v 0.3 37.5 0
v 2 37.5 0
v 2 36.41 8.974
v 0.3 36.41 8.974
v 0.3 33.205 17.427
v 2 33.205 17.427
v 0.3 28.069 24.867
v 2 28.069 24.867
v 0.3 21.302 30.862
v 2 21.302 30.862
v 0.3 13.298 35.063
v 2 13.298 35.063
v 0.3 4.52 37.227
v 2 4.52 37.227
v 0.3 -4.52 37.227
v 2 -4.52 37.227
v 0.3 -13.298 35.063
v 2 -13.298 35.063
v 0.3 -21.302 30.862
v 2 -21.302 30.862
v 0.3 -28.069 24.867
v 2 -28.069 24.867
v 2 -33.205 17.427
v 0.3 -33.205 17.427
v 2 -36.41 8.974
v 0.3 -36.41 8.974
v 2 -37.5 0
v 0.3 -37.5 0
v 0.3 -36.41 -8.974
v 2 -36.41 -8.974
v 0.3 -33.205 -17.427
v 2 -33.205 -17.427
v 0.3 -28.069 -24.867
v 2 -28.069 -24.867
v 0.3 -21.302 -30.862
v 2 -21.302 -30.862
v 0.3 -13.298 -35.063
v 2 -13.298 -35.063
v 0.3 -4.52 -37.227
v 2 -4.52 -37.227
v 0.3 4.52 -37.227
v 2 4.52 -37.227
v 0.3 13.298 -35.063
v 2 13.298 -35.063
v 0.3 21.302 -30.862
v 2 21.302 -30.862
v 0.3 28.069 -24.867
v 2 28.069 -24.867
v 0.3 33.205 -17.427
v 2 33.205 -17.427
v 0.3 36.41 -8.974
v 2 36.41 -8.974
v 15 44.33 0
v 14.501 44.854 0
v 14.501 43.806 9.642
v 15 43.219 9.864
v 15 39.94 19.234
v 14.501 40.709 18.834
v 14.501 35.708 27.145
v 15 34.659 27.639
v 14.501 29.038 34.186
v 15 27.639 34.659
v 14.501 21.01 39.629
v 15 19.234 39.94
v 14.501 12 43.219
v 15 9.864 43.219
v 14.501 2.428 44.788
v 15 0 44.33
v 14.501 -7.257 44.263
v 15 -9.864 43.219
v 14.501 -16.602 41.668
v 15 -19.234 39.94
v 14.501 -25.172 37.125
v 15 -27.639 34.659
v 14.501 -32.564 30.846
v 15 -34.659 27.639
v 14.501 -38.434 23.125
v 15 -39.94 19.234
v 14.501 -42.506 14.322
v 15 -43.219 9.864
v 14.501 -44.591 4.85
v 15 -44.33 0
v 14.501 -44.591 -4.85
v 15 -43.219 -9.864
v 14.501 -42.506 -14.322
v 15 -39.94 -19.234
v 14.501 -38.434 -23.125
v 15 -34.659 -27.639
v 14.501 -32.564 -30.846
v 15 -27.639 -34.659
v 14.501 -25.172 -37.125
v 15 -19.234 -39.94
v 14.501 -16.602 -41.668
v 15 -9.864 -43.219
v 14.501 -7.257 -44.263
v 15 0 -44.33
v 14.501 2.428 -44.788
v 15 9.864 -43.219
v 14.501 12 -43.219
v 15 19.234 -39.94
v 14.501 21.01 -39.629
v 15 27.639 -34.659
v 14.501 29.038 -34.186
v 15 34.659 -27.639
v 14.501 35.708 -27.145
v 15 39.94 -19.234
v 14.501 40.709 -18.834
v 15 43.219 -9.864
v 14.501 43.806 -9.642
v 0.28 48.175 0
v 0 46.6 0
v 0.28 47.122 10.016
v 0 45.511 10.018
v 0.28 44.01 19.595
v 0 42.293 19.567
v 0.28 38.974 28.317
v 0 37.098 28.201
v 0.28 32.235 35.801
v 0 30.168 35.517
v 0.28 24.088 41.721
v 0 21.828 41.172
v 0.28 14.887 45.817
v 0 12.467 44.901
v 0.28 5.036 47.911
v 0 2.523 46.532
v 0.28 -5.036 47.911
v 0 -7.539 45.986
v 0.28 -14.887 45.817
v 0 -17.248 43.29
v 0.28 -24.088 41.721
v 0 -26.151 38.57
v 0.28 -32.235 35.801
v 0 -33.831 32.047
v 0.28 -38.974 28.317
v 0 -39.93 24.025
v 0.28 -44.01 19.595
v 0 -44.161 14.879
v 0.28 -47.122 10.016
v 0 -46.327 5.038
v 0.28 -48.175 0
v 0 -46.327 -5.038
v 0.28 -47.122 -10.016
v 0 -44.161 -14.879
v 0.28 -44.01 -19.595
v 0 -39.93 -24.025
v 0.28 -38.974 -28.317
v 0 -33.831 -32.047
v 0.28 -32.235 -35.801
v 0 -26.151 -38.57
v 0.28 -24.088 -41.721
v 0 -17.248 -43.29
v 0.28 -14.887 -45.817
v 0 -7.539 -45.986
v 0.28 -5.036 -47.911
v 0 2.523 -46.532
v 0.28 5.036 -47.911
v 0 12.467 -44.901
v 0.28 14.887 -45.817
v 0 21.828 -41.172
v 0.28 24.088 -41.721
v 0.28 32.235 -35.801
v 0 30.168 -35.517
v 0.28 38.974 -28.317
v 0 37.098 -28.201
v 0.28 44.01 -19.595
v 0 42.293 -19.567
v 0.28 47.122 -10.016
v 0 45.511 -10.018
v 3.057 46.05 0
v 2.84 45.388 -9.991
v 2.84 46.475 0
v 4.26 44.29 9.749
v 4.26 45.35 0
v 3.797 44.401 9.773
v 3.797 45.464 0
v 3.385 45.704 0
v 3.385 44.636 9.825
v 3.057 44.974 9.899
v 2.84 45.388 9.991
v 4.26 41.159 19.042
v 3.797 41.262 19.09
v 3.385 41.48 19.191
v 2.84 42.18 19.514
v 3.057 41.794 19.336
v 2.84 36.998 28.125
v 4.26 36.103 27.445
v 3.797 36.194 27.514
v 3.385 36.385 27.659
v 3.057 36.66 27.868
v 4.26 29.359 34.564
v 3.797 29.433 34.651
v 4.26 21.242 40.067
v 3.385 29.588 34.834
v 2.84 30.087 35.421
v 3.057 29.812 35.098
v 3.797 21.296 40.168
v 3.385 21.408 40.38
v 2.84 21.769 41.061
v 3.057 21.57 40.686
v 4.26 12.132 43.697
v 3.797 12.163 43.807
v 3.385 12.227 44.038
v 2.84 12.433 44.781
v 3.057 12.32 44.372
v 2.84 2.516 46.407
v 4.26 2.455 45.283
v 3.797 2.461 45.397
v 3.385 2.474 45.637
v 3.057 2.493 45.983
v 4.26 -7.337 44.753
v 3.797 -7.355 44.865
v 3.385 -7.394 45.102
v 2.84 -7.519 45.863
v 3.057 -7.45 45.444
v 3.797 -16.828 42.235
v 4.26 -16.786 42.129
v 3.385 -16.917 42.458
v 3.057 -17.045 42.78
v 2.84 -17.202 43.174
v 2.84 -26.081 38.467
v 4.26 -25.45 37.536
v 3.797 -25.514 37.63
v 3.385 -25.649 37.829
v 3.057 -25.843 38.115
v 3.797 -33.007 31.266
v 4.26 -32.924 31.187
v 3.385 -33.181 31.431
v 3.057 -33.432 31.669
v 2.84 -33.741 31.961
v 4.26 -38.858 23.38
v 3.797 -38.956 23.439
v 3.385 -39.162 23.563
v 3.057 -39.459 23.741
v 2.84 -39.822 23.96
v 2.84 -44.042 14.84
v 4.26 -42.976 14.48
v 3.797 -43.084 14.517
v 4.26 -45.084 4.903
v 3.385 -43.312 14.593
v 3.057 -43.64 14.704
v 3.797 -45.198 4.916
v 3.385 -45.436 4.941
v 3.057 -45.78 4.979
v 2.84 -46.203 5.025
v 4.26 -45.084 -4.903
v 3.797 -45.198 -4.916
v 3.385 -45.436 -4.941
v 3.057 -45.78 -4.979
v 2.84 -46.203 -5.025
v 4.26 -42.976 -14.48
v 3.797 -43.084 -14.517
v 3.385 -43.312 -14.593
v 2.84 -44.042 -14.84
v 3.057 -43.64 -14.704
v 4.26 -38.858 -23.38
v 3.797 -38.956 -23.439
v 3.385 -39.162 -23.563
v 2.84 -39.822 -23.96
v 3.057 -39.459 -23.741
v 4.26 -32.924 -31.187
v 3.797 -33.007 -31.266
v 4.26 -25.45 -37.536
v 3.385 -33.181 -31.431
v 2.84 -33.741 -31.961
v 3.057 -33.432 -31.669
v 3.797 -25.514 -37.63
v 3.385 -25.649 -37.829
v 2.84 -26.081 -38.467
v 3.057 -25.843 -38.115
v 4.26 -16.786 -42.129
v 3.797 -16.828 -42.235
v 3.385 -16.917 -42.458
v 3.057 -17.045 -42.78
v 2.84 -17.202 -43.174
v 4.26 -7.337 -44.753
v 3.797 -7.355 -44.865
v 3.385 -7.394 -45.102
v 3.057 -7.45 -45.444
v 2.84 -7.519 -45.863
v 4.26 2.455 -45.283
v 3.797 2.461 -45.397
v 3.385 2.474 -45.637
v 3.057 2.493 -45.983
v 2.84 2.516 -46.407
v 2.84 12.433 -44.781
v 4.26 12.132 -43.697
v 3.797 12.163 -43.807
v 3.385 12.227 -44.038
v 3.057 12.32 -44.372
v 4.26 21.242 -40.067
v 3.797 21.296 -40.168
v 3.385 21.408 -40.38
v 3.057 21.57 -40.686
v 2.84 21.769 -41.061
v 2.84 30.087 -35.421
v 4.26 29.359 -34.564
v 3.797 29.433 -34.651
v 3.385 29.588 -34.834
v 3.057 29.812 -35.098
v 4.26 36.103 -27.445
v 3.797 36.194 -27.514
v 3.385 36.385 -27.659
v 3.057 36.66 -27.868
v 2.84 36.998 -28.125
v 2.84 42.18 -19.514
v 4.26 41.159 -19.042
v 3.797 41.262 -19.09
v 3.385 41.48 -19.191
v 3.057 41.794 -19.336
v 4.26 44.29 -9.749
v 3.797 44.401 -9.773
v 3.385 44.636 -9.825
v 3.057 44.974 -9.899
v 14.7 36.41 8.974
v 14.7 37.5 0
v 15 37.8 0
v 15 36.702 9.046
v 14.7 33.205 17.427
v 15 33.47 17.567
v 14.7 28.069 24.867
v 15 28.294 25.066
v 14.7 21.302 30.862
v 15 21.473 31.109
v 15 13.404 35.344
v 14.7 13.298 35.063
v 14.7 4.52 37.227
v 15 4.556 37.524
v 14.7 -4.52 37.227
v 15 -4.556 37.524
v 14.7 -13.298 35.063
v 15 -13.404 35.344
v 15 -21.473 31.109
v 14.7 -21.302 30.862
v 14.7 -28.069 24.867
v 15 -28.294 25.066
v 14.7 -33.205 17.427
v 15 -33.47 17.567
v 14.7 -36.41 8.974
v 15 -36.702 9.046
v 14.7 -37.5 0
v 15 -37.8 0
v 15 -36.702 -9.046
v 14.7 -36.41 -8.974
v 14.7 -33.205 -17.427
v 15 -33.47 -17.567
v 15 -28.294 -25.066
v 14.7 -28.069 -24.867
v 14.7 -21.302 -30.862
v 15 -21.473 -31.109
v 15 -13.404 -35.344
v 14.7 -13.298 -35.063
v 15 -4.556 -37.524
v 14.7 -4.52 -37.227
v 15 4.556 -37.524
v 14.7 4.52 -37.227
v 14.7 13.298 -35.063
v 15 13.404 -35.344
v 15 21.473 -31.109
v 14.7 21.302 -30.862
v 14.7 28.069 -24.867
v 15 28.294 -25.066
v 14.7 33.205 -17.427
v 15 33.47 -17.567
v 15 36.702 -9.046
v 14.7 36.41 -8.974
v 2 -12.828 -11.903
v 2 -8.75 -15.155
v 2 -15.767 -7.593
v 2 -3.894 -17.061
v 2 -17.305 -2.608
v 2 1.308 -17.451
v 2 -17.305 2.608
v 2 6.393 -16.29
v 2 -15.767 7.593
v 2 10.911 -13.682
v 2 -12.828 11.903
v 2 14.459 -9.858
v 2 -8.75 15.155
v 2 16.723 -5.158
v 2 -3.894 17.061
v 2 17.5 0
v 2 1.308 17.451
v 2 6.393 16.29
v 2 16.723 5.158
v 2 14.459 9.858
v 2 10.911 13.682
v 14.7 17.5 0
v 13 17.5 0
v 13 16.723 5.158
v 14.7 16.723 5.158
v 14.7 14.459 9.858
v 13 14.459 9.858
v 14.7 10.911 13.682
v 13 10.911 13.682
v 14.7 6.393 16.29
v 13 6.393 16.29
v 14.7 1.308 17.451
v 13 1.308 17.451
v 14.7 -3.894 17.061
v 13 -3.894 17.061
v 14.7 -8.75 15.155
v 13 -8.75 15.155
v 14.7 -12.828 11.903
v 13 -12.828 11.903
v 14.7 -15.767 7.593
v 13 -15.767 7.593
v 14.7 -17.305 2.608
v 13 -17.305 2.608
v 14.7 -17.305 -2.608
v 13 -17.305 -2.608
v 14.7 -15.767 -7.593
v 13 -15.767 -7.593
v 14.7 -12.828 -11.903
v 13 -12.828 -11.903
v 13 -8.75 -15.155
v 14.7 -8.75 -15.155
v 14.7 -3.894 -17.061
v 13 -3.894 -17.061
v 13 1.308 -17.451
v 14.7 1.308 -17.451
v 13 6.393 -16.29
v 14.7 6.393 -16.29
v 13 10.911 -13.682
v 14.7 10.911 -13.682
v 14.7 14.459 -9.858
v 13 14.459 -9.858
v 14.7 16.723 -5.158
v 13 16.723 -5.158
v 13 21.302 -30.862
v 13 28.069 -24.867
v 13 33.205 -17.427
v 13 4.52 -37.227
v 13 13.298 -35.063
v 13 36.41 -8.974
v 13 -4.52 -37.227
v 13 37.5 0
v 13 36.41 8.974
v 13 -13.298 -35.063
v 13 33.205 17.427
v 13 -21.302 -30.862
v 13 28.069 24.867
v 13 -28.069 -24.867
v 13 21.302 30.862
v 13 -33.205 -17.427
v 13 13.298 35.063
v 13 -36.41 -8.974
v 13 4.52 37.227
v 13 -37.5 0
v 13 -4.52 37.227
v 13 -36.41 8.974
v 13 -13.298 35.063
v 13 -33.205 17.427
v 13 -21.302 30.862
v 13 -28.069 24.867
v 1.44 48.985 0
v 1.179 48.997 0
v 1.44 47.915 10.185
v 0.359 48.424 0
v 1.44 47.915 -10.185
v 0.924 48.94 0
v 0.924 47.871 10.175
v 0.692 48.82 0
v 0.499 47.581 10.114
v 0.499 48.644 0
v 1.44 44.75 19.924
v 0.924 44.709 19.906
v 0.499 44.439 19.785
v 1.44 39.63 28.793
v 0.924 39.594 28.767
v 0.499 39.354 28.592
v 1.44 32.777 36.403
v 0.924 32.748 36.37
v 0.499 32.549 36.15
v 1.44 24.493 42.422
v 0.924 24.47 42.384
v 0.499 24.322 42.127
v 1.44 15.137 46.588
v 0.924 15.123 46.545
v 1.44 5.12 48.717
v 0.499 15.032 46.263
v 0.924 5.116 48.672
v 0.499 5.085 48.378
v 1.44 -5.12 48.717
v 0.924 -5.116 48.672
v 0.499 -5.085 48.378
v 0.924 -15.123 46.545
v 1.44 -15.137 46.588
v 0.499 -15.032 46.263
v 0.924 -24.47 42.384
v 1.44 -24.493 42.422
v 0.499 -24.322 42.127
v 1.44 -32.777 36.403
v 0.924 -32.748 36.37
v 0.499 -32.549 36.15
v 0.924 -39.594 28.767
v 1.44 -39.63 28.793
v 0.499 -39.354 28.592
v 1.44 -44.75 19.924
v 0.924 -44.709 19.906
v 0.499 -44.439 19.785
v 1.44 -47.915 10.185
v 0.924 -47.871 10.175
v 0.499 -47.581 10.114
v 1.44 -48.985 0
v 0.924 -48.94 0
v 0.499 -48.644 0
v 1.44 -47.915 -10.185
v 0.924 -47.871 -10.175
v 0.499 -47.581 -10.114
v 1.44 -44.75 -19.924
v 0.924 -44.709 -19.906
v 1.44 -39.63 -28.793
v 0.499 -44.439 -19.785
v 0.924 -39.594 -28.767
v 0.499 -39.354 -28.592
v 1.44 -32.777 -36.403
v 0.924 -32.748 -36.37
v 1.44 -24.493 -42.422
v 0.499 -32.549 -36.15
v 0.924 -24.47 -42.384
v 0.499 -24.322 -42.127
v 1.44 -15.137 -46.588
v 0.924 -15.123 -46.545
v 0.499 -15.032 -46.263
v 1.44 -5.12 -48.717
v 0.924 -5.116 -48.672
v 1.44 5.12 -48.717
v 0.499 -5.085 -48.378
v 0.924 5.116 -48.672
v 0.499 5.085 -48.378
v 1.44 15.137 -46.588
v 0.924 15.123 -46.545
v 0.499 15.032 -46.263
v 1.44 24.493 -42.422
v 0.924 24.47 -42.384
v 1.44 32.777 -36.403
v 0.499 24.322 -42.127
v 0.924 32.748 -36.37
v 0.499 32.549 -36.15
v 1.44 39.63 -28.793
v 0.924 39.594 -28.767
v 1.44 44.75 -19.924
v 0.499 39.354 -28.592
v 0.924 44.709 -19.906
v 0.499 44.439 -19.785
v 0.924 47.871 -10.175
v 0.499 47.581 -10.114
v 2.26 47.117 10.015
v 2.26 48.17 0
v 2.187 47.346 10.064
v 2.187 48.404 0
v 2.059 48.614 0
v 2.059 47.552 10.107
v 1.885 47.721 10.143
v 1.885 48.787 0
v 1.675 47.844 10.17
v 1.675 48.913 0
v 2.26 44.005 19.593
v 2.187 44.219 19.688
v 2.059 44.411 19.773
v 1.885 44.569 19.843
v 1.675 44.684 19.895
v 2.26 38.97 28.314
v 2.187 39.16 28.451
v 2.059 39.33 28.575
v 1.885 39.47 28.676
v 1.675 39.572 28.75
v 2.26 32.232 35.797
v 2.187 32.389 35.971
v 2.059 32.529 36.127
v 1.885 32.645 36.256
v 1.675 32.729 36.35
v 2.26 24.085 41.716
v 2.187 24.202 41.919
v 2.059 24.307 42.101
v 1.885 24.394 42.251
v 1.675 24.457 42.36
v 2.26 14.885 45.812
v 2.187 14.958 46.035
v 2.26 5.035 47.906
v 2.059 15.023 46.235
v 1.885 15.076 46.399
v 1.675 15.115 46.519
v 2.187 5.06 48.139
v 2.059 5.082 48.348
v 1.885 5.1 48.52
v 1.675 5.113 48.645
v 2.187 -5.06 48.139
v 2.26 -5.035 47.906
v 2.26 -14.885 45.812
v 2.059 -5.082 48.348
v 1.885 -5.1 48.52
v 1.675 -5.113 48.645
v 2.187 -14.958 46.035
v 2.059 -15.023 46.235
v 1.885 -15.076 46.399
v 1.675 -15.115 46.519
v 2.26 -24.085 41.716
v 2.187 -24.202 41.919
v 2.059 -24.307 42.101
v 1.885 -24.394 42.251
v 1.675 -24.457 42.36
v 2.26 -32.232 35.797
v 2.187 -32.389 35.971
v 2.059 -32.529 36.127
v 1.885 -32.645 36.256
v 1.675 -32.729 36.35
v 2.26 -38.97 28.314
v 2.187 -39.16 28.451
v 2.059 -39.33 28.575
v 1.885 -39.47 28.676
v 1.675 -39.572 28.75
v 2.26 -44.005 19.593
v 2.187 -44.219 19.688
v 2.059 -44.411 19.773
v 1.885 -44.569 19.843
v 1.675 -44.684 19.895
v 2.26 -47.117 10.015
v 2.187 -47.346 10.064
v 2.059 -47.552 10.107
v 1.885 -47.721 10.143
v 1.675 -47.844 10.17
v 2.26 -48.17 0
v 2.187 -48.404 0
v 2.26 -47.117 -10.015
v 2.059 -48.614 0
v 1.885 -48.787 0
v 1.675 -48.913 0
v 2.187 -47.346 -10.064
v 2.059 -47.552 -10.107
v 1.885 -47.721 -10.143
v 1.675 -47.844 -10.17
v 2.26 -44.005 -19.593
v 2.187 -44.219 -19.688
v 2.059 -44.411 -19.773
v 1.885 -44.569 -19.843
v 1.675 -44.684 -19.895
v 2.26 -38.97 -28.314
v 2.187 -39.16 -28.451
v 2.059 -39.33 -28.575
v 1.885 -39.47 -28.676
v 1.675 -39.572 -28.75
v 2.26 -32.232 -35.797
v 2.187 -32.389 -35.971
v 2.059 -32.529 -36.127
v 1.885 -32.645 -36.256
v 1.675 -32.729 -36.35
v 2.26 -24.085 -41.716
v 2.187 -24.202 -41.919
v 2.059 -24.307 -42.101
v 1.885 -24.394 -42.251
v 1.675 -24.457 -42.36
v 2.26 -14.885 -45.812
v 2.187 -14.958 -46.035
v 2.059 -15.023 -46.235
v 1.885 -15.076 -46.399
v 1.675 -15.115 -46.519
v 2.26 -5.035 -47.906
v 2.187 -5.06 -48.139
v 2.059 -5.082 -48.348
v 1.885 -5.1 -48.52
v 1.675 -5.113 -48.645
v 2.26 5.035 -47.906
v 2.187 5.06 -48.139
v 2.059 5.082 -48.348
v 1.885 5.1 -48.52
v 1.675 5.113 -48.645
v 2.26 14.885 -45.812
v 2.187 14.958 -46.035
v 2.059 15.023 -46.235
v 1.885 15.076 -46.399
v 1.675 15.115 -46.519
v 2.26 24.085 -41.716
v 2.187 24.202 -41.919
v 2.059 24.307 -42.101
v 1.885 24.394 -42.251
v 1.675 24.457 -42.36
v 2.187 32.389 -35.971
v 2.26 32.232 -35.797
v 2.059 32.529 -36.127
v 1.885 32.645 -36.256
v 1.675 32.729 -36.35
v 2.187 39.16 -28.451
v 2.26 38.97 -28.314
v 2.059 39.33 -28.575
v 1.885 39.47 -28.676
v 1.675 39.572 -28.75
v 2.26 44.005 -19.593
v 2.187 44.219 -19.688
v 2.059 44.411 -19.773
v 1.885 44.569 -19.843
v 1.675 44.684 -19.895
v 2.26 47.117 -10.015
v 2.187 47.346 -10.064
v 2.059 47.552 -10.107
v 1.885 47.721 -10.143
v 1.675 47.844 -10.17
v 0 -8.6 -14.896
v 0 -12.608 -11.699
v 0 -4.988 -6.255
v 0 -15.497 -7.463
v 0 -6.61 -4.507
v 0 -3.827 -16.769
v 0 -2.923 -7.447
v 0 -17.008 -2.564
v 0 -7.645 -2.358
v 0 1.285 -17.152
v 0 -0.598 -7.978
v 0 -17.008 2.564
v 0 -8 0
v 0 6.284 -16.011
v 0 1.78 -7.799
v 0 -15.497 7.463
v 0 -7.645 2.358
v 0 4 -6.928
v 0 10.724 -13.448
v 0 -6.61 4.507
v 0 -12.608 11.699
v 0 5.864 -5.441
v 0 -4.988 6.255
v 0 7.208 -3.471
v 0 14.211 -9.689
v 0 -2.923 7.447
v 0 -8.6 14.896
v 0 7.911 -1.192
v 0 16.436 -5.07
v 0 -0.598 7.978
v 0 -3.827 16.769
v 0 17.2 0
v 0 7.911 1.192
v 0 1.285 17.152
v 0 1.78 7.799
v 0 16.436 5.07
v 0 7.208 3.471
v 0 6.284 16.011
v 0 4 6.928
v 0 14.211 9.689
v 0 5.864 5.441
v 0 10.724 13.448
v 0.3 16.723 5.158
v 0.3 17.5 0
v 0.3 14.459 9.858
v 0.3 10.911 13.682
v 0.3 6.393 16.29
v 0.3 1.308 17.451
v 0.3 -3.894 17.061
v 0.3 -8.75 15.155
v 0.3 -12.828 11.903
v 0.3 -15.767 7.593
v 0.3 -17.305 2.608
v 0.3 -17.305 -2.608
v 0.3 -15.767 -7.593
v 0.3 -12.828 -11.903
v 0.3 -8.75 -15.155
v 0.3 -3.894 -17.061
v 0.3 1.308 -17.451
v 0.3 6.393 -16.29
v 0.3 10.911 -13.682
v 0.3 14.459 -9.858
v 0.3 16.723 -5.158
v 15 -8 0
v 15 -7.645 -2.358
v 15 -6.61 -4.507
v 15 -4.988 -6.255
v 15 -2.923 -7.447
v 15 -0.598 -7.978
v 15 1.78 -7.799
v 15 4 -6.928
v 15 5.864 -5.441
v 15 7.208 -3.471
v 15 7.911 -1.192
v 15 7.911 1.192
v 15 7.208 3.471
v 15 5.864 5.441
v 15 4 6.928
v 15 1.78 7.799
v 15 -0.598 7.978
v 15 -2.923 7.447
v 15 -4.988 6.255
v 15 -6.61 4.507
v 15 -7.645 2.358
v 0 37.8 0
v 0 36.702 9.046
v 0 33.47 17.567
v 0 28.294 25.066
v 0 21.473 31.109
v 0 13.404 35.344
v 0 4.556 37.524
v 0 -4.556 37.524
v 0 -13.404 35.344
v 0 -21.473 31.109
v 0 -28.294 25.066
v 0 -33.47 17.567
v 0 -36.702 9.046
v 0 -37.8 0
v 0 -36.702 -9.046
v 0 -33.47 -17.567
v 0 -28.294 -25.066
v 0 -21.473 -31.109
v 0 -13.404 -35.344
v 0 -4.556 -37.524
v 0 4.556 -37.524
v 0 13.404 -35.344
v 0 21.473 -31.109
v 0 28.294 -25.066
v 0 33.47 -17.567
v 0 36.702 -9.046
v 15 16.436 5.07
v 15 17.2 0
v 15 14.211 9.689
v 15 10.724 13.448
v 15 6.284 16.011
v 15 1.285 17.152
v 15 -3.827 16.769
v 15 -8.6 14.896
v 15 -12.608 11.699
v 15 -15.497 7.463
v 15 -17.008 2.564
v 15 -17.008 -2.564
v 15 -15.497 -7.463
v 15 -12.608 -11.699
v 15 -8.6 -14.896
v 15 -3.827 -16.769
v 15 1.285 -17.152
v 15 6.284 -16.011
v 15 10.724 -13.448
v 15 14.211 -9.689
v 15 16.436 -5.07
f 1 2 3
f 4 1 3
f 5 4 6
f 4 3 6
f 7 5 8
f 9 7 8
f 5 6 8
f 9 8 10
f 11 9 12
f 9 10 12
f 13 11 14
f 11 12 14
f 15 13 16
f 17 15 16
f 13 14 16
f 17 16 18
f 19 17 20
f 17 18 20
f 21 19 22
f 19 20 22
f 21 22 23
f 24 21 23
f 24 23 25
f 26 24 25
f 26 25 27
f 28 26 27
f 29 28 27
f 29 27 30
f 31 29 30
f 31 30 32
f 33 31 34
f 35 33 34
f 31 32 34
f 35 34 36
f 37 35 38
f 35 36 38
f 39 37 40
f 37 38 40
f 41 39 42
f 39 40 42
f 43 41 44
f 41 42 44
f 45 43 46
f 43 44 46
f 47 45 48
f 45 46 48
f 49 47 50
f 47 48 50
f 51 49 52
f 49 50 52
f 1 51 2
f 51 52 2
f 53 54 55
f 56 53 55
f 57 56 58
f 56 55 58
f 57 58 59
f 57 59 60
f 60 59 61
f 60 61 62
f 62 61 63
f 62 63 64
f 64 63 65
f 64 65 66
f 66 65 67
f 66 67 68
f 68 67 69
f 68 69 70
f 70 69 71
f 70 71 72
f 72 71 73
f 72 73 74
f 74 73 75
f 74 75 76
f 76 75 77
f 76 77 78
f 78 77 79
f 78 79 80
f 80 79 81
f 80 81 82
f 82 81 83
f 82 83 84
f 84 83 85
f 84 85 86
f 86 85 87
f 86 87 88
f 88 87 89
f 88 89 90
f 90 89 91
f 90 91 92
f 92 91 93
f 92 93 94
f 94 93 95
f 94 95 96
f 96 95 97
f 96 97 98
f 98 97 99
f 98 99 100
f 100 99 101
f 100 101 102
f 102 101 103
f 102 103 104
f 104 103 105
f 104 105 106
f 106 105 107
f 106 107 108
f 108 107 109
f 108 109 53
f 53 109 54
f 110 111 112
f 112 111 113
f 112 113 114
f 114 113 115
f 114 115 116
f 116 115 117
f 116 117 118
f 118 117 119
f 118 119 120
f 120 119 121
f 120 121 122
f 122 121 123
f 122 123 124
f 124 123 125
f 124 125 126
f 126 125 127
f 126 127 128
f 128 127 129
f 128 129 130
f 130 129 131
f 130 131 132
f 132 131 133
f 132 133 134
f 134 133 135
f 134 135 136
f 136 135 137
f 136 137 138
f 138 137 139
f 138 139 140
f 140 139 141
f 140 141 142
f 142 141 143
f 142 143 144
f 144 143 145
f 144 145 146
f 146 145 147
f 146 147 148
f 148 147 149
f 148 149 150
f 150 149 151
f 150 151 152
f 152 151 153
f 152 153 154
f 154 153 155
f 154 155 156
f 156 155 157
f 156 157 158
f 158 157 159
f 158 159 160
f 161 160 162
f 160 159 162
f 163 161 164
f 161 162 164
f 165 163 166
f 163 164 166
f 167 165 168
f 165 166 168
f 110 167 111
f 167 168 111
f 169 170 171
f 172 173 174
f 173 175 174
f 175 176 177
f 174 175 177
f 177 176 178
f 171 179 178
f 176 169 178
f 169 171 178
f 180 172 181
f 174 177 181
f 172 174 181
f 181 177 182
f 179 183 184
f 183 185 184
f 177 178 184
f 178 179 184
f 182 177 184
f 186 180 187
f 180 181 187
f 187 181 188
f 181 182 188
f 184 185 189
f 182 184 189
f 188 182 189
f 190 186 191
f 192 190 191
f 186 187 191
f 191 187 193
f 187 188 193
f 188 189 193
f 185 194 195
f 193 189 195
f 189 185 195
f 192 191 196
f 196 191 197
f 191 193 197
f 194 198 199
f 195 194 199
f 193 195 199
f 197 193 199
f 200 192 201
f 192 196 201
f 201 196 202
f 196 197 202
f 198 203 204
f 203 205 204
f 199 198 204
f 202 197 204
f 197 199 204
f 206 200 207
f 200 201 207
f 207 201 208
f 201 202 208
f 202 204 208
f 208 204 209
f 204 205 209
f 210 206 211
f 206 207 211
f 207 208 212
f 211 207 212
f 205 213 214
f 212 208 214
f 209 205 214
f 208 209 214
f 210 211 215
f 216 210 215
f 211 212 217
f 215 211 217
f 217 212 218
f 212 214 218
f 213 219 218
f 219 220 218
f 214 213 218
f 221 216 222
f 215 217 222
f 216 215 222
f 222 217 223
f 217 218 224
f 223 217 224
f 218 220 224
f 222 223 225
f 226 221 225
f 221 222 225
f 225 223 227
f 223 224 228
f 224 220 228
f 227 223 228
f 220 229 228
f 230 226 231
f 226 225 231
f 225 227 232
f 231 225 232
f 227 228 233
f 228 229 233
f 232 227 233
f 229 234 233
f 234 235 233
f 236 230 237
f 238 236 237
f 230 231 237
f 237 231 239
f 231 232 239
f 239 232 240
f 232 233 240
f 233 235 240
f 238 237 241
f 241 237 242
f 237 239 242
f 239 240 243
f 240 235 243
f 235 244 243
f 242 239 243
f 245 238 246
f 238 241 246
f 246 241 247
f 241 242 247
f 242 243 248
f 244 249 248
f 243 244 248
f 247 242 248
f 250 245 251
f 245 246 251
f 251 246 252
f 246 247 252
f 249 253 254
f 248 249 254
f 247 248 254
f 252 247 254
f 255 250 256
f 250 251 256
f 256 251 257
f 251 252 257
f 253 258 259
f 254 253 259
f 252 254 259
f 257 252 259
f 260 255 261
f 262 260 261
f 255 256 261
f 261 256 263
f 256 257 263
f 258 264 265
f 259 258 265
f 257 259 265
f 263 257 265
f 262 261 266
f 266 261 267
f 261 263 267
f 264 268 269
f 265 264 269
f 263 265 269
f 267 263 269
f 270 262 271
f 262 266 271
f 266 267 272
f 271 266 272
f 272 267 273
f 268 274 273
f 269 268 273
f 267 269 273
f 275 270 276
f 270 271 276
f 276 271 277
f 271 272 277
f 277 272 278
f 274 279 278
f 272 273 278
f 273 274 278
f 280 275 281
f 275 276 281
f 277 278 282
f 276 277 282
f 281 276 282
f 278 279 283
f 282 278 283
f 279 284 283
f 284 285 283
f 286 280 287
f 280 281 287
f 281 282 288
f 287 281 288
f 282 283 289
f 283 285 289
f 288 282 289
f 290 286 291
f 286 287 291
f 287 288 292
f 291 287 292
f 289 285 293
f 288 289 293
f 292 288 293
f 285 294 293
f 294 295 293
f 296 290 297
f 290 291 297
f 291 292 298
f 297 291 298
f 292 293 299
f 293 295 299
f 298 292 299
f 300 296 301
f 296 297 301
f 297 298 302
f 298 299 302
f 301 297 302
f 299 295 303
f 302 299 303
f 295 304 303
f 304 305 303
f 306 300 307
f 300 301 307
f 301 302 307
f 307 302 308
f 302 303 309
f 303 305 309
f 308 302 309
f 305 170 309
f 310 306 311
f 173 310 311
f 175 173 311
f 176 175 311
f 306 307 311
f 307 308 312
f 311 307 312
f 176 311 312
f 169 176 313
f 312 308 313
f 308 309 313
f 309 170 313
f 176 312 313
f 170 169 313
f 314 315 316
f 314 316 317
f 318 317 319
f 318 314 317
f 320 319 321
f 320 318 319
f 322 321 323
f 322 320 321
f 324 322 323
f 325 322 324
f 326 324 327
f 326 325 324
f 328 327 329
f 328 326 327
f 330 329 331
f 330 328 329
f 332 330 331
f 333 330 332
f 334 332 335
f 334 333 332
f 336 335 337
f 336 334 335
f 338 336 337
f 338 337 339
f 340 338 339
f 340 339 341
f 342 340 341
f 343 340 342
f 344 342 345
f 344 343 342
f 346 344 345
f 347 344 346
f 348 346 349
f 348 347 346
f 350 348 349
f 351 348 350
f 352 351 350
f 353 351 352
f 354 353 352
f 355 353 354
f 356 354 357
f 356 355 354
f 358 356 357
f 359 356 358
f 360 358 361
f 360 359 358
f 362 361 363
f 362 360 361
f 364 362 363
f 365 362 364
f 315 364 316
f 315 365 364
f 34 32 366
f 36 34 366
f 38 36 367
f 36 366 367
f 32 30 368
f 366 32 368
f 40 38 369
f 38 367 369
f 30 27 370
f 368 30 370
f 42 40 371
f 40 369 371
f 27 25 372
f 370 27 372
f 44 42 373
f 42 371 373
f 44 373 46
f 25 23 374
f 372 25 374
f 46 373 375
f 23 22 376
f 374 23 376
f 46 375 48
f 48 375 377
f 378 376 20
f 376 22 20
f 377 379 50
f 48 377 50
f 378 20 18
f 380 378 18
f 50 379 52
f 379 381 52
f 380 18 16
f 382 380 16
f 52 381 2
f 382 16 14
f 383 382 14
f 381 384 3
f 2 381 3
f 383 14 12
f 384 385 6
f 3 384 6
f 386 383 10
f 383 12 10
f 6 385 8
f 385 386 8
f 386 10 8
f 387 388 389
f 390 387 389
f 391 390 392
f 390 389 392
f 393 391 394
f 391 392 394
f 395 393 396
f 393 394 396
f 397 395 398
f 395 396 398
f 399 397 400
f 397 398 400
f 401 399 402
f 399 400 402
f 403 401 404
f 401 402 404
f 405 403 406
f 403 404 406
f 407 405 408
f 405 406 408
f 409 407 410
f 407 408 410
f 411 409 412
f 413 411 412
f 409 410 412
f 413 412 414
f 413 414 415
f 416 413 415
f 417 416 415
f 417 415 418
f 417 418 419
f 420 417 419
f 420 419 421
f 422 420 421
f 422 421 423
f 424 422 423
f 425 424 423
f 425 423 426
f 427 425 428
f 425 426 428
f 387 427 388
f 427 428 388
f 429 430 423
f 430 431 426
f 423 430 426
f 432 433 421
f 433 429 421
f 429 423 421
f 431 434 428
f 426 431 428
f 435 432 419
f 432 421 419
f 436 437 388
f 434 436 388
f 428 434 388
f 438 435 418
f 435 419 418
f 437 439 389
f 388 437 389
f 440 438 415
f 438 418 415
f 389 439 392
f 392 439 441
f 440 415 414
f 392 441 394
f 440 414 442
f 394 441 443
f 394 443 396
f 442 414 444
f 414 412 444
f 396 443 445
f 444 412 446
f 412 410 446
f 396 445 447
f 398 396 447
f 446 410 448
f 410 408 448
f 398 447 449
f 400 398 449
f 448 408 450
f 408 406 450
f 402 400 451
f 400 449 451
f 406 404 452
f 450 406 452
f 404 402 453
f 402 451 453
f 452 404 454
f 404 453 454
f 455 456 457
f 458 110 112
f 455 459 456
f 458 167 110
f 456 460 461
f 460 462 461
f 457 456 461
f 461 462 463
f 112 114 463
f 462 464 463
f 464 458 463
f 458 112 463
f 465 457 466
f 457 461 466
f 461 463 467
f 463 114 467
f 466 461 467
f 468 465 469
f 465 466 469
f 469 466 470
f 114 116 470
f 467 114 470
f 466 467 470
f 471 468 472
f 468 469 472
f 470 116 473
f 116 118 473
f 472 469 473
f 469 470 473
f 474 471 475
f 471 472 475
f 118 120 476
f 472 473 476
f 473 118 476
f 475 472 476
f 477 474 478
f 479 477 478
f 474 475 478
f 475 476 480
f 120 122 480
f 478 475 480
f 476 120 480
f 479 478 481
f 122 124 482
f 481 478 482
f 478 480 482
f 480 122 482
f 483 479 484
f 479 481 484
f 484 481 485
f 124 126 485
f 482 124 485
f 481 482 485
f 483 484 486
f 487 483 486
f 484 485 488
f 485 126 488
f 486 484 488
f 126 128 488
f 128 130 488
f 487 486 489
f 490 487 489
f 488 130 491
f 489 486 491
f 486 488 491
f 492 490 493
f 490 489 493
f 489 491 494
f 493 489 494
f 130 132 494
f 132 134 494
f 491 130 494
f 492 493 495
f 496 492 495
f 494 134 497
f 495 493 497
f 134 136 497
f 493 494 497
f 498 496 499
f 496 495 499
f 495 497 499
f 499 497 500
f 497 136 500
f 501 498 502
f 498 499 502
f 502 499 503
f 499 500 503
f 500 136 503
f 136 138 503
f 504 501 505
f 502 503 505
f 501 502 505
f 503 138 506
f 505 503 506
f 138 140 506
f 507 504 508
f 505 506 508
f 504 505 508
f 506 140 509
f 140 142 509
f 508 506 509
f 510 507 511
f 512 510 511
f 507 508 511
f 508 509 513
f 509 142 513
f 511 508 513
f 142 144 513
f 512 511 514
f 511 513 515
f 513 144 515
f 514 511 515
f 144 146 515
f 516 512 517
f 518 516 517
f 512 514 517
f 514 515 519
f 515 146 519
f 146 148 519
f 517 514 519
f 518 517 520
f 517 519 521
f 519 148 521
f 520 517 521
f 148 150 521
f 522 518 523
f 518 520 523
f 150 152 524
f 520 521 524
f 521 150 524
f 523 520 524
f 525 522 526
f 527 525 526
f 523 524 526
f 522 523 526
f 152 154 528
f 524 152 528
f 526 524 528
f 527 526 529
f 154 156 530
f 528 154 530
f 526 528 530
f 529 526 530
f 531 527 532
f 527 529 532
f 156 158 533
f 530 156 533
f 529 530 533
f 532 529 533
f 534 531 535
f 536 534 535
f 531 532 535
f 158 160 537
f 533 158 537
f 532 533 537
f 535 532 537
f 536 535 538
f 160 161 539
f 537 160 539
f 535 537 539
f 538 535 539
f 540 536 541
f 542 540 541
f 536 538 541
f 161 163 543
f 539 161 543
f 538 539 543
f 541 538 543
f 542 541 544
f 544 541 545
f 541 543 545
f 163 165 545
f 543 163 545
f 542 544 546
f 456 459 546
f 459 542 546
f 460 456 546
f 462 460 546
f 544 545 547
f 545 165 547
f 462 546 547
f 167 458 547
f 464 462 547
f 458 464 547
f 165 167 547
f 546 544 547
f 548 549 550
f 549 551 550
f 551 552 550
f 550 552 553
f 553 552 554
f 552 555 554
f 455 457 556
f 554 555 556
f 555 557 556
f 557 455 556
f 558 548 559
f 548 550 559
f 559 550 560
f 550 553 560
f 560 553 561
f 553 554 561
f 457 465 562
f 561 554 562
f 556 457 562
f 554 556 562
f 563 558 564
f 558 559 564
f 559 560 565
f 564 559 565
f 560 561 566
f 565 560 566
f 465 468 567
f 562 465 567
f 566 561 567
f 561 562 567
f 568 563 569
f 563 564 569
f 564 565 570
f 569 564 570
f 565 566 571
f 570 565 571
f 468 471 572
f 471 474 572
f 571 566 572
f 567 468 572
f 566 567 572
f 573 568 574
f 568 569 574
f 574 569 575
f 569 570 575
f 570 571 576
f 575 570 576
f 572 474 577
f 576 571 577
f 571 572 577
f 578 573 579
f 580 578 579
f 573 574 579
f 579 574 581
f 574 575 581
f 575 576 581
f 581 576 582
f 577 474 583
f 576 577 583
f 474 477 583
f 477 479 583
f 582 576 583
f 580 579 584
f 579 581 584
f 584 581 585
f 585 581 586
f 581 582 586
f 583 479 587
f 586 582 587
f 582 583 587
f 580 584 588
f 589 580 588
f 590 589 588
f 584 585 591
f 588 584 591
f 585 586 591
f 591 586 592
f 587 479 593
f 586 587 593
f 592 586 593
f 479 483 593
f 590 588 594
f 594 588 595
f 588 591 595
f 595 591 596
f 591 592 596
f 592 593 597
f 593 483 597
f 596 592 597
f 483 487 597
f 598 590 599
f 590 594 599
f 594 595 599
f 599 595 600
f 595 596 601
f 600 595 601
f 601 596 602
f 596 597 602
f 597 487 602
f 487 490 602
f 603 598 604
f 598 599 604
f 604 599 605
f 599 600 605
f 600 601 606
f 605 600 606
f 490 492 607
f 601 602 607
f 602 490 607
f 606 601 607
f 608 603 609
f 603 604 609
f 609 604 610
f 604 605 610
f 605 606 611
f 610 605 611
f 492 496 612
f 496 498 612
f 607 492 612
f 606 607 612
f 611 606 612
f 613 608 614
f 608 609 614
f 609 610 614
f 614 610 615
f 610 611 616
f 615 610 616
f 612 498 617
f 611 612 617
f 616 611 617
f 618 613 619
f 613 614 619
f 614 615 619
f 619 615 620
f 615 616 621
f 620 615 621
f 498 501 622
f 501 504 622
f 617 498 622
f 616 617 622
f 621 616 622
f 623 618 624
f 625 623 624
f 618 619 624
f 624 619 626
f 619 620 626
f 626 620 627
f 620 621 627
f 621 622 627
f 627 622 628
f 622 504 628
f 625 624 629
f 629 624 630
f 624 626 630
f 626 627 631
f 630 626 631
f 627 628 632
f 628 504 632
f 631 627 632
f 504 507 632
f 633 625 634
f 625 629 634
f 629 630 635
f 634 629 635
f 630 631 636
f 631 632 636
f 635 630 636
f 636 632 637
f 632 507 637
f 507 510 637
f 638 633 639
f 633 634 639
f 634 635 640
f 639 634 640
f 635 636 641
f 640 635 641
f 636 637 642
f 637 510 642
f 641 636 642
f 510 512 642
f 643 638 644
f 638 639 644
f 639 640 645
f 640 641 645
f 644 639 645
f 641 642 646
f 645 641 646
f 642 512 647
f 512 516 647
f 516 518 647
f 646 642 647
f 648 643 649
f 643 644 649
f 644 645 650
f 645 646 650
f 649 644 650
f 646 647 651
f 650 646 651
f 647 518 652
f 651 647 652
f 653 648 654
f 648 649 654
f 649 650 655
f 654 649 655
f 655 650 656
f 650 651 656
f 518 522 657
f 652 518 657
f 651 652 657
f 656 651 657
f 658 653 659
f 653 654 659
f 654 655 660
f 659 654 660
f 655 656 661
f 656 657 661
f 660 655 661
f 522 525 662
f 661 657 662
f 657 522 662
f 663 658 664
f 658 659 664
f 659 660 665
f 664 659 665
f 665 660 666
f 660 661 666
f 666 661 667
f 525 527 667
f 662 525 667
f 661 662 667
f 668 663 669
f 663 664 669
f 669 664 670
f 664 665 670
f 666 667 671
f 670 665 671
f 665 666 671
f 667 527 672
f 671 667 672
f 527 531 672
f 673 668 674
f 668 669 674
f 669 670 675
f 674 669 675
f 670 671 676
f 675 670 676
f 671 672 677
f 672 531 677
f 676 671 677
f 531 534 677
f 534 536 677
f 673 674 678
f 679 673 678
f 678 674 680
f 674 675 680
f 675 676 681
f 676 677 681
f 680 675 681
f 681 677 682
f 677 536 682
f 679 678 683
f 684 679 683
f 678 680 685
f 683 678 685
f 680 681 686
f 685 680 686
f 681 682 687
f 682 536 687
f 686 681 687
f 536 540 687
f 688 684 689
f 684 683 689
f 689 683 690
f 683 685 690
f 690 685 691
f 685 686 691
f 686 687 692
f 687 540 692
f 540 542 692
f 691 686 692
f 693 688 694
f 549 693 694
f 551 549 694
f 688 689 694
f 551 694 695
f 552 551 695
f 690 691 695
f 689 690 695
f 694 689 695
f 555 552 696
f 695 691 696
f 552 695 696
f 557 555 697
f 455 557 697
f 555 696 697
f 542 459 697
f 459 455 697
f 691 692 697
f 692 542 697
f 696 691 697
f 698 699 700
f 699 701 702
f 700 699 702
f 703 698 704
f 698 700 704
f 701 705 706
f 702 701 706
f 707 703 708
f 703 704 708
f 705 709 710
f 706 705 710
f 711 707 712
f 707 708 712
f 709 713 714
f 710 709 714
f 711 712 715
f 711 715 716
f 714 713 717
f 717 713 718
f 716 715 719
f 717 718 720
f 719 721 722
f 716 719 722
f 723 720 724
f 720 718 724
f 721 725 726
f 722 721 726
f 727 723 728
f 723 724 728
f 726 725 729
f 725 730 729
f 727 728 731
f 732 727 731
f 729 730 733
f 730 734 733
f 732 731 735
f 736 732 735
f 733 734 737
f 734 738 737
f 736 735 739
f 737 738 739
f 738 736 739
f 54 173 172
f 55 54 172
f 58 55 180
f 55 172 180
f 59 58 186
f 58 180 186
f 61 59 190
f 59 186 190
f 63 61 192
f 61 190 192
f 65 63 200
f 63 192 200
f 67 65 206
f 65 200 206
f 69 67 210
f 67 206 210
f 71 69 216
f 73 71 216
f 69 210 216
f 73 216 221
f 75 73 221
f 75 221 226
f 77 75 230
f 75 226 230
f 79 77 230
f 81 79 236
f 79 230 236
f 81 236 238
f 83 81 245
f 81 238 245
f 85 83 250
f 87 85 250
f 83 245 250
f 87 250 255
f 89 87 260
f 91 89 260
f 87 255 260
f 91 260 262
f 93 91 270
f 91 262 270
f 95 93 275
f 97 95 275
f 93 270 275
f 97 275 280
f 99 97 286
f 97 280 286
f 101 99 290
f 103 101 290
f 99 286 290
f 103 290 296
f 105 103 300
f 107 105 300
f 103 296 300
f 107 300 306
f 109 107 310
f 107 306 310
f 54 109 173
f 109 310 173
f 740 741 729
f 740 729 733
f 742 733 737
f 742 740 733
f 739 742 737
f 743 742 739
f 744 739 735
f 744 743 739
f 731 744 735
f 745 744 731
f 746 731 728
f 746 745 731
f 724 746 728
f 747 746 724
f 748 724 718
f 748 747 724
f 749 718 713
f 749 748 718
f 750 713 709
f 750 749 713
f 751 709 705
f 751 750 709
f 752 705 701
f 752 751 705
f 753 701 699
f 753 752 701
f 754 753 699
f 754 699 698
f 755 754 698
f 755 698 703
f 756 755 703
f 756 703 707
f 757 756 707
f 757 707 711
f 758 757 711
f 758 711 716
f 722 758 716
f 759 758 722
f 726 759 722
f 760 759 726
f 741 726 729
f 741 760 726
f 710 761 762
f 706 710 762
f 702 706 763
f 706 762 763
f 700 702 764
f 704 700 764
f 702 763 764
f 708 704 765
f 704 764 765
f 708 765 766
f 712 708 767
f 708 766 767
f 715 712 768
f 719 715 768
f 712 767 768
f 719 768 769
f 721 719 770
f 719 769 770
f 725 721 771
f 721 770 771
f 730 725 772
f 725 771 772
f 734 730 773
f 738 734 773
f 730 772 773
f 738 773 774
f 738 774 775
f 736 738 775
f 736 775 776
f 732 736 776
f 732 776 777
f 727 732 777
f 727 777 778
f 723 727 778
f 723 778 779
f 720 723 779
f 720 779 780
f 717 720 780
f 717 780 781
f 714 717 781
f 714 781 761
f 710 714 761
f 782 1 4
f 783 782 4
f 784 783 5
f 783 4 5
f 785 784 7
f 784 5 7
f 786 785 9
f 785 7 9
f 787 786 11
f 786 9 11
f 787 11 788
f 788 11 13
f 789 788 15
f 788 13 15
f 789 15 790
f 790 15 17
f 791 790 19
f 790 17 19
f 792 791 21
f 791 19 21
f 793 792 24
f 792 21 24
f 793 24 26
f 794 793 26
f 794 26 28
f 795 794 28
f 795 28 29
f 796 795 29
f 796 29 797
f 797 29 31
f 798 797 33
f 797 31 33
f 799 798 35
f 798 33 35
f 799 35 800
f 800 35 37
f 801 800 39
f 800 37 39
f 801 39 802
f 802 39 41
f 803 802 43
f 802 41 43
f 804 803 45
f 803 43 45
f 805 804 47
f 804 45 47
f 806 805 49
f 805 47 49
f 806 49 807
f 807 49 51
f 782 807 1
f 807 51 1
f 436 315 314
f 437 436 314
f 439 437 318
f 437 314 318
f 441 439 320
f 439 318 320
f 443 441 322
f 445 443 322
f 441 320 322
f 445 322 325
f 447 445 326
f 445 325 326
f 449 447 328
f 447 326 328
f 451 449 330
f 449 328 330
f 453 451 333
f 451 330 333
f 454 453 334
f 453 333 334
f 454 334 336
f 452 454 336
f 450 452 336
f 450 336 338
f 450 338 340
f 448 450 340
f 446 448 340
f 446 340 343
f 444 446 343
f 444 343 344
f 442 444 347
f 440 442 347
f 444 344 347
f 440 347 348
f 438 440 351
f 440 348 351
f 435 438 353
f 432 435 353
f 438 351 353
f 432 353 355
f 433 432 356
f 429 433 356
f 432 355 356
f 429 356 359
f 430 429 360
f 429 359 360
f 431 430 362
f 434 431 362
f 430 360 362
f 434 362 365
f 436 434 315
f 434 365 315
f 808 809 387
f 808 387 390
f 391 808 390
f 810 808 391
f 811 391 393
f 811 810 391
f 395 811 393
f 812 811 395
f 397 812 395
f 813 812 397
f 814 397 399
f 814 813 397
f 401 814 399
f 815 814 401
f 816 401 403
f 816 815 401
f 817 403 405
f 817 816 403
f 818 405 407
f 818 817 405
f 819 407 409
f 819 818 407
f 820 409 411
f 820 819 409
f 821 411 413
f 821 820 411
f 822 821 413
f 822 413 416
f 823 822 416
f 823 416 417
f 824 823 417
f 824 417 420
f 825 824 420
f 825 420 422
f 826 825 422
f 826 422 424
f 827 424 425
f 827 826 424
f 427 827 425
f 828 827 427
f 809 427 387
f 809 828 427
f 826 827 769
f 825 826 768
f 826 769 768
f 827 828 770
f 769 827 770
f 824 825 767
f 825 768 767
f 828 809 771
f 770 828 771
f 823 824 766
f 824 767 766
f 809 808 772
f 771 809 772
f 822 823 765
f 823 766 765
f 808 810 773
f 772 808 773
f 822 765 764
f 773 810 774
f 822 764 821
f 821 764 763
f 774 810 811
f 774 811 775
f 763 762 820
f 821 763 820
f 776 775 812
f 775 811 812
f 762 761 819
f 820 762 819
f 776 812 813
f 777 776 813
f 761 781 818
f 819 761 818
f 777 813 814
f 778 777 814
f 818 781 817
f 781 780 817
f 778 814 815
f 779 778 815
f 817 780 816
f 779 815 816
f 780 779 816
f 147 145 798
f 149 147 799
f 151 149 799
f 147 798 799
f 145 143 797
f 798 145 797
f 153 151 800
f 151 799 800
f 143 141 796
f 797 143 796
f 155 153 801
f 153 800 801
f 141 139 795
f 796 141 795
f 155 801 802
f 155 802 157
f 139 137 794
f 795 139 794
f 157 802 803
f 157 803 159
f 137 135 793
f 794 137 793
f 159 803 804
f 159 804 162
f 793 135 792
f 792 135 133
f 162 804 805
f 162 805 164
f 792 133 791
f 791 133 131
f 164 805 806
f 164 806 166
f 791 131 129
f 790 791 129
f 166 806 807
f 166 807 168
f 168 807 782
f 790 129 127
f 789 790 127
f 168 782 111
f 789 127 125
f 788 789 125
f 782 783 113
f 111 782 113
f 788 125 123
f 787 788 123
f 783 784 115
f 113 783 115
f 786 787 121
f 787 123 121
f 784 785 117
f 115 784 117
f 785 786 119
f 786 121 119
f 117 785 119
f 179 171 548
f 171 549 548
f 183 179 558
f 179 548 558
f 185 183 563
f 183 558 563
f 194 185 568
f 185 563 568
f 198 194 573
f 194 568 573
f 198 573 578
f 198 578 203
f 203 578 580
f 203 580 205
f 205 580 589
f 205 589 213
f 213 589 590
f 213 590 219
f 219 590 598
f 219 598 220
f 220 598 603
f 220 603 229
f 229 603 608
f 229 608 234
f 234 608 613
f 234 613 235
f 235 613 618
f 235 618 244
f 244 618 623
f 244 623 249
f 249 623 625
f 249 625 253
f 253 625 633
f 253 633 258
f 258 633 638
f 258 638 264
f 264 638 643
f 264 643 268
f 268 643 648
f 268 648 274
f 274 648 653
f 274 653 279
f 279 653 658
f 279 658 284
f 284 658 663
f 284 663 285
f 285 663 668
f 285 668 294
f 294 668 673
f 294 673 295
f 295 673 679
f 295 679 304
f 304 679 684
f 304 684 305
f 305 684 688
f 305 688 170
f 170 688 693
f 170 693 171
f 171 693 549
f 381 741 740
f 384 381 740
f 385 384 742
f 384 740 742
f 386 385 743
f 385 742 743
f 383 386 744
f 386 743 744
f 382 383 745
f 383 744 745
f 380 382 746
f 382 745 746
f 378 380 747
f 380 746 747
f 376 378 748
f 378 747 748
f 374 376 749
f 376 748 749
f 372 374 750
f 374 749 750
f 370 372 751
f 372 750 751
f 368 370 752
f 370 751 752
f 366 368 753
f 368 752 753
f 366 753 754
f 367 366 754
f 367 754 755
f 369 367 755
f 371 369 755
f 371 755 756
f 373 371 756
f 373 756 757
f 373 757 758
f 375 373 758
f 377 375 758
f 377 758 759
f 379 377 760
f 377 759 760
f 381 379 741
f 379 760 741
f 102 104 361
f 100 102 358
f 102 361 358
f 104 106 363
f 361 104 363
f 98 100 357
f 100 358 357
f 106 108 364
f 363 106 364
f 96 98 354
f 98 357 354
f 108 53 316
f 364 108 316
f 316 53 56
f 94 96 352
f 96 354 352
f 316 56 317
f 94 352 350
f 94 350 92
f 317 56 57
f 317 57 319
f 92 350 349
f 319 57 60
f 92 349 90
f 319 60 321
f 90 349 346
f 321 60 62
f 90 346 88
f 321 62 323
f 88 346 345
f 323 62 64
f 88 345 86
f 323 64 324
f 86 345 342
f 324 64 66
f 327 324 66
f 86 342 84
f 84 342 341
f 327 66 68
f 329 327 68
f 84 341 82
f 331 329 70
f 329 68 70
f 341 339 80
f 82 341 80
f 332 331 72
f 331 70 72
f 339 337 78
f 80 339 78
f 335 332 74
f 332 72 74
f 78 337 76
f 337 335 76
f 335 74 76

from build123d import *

# Parameters (mm, degrees)
F2_SIZE = 0.5
F4_D    = 16
F5_SIZE = 0.3


with BuildPart() as f1:
    # F0 (on Top) → F1 (revolve)
    with BuildSketch(Plane.XY):
        with BuildLine():
            Line((0, 17.5), (0, 0))
            Line((0, 0), (15, 0))
            Line((15, 0), (15, 17.5))
            Line((15, 17.5), (13, 17.5))
            Line((13, 17.5), (13, 37.5))
            Line((13, 37.5), (15, 37.5))
            Line((15, 37.5), (15, 44.83))
            Line((15, 44.83), (4.26, 45.35))
            ThreePointArc((4.26, 45.35), (3.3848643751, 45.7040621445), (2.84, 46.475))
            Line((2.84, 46.475), (2.26, 48.17))
            ThreePointArc((2.26, 48.17), (1.9775337426, 48.7058161582), (1.44, 48.985))
            ThreePointArc((1.44, 48.985), (0.6922694491, 48.8202067149), (0.28, 48.175))
            Line((0.28, 48.175), (0, 46.6))
            Line((0, 46.6), (0, 37.5))
            Line((0, 37.5), (2, 37.5))
            Line((2, 37.5), (2, 17.5))
            Line((2, 17.5), (0, 17.5))
        make_face()
    revolve(axis=Axis((7.5, 0, 0), (1, 0, 0)))

    # F2
    f2_edges = [f1.edges().sort_by_distance(p)[0] for p in [
        (15, -44.83, 0),
    ]]
    chamfer(f2_edges, length=F2_SIZE)

    # F4 (through all)
    with Locations(Plane(origin=(0, 0, 0), x_dir=(0, 1, 0), z_dir=(-1, 0, 0))):
        with Locations((0, 0)):
            Hole(F4_D / 2)

    # F5
    f5_edges = [f1.edges().sort_by_distance(p)[0] for p in [
        (15, -37.5, 0),
        (15, -17.5, 0),
        (0, -17.5, 0),
        (0, -37.5, 0),
    ]]
    chamfer(f5_edges, length=F5_SIZE)


solid = f1.part
